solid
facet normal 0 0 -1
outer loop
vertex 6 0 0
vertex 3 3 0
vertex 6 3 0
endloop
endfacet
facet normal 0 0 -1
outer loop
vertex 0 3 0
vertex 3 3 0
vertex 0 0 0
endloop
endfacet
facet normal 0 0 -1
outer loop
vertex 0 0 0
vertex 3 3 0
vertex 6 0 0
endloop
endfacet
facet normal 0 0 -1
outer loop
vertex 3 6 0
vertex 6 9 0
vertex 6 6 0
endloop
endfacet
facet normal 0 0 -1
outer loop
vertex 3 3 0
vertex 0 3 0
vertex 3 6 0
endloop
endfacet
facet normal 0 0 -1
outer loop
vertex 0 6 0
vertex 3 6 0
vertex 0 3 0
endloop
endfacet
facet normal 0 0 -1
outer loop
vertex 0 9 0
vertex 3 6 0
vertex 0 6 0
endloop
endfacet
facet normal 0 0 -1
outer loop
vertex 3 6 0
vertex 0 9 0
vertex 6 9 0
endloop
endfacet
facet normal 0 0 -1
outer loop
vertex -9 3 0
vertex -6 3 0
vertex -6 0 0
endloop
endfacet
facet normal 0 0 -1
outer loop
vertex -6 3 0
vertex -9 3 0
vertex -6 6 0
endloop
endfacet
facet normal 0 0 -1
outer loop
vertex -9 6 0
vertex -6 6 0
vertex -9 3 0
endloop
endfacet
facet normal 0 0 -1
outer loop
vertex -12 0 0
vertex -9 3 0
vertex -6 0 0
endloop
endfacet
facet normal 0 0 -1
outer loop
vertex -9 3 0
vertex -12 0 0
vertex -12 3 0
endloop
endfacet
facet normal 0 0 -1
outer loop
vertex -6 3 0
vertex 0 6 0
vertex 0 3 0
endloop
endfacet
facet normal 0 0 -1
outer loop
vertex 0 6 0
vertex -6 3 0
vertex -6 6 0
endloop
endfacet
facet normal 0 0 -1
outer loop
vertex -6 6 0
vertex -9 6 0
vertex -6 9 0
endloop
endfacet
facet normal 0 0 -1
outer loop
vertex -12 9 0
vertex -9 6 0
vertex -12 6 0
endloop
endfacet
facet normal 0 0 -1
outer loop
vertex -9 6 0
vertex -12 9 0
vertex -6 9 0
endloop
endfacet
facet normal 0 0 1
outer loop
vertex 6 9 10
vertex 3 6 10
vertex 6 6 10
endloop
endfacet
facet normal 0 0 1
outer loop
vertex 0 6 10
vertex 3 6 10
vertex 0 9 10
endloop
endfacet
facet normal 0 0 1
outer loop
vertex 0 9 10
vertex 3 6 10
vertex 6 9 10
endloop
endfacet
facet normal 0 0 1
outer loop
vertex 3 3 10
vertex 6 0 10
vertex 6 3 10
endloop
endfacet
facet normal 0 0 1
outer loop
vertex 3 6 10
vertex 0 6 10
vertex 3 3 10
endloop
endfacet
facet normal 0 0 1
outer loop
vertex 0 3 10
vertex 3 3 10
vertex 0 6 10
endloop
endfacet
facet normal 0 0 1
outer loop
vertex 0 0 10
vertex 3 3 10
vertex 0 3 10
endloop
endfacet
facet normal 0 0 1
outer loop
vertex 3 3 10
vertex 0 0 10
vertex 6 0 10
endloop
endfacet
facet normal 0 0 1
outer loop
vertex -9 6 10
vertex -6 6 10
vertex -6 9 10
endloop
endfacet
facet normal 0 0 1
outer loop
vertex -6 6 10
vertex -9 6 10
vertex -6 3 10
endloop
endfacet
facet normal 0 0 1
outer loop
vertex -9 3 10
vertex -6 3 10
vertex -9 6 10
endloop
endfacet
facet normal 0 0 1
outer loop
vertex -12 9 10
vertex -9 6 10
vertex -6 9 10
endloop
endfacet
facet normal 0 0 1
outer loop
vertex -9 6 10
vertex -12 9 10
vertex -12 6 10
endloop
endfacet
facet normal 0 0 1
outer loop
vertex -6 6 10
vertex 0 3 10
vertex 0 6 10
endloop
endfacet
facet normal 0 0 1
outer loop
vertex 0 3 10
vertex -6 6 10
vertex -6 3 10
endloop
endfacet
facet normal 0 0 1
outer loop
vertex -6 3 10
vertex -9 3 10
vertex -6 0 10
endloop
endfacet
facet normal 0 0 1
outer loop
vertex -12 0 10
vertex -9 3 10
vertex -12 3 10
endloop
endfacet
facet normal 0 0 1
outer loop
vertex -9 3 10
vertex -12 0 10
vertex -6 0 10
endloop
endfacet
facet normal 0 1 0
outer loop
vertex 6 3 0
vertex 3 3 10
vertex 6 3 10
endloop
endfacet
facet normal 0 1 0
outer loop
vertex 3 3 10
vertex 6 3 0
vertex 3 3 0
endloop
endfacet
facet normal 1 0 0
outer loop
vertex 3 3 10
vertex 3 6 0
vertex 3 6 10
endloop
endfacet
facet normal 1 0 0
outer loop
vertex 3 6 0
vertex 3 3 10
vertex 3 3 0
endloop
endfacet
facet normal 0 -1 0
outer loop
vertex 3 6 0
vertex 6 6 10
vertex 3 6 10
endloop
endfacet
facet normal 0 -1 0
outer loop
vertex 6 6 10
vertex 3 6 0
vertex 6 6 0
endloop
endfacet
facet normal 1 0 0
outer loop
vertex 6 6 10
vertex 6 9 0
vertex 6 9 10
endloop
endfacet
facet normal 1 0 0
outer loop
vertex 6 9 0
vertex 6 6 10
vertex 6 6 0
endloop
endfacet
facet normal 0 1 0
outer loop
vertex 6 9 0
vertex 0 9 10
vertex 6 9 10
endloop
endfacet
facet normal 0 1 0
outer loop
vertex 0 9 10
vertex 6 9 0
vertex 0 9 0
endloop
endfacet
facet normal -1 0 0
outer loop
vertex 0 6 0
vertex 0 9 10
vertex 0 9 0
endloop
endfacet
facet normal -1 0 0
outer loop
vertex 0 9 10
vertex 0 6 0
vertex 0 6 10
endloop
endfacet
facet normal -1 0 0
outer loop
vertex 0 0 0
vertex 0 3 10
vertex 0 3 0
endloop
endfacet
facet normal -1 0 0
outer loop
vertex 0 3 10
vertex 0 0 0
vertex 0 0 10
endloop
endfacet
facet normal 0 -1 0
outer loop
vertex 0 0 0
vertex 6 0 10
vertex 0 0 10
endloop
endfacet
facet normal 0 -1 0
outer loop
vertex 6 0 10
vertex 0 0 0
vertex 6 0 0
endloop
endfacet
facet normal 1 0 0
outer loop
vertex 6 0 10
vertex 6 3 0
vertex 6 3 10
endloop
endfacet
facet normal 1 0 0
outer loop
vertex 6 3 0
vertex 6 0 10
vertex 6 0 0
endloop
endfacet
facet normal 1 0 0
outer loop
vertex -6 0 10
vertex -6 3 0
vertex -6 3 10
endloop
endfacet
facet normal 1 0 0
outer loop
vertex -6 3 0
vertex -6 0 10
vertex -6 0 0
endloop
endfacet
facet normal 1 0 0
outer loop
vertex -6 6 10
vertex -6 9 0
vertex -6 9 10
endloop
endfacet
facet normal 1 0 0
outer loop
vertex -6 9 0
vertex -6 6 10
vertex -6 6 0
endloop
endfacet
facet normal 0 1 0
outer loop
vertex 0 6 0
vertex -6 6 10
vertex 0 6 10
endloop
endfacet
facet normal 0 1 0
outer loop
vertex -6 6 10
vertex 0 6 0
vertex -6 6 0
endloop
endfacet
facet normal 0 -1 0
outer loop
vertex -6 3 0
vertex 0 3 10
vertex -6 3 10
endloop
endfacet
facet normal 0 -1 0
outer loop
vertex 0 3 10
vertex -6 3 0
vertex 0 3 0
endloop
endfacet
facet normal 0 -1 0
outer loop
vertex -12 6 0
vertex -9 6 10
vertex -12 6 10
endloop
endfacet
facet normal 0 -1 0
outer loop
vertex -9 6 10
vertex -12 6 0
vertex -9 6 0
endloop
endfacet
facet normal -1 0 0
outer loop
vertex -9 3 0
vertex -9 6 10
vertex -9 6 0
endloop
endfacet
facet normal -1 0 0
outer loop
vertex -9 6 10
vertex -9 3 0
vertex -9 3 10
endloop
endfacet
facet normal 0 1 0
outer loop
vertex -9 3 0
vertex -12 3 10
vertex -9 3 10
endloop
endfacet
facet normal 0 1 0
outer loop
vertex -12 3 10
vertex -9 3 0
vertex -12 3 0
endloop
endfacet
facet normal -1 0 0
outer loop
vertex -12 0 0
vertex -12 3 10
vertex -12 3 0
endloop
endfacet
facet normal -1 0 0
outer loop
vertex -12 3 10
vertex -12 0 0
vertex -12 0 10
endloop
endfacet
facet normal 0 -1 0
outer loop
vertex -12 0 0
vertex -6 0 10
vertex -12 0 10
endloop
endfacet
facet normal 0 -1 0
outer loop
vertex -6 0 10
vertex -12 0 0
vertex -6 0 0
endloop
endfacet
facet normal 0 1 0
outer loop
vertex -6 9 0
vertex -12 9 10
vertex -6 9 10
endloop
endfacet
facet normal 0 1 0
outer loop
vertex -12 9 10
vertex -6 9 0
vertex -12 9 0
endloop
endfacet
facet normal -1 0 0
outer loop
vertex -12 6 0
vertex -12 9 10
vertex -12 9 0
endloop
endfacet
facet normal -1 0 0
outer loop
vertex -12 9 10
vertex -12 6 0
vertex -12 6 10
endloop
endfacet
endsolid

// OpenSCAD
module SimpleCorner(wallWidth = 3,
                    totalWidth = 50,
                    totalHeight = 50,
                    totalDepth = 50,
                    gutterWidth = 3)
{
    // back wall
    cube([totalWidth,wallWidth,totalHeight]);
    // side wall
    translate([totalWidth,0,0])
        rotate([0,0,90])
            cube([totalDepth,wallWidth,totalHeight]);
    // base
    translate([0,totalDepth,0])
        rotate([90, 0, 0])
            cube([totalWidth,
                  wallWidth,
                  totalDepth]);
    // back gutter
    translate([0,
               wallWidth + gutterWidth,
               wallWidth * 2])
        rotate([0,90,0])
            cube([wallWidth, 
                  wallWidth, 
                  totalWidth - wallWidth - gutterWidth]);
    // side gutter
    translate([totalWidth - 2 * wallWidth - gutterWidth,
               totalDepth,
               wallWidth])
        rotate([90,0,0])
            cube([wallWidth, 
                  wallWidth, 
                  totalDepth - wallWidth - gutterWidth]);
    // gutter fill
    cube(3);
}
module Cone(holeRadius = 3)
{
    centerRadius    = 3;
    centerHeight    = 2;
    masterRadius    = 18;
    totalHeight     = 3;
    tanAlpha        = totalHeight / (masterRadius - centerRadius);
    holeHeight      = tanAlpha * (masterRadius - holeRadius);
    rotate_extrude()
        polygon(points=[
            [0, 0],
            [masterRadius, 0],
            [holeRadius, holeHeight],
            [holeRadius, 1],
            [0, 1]
        ]);
}
module Base(width = 50,
       depth = 50,
       halfHeight = 3)
{
    cube([width, depth, halfHeight]);
    translate([width / 2, depth / 2, halfHeight])
        Cone(3.5);
}

module BasedCorner(wallWidth = 3,
                   width = 50,
                   height = 50,
                   depth = 50,
                   gutterWidth = 3.4)
{
    translate([0, 0, wallWidth])
        union() {
            SimpleCorner(wallWidth, 
                         width, 
                         height - wallWidth, 
                         depth,
                         gutterWidth);
            translate([0,0, -wallWidth])
                difference() {
                    cube([width, depth, wallWidth]);
                    translate([width/2, depth/2, -.01])
                        Cone();
            }
        }
}

module top_profile(gutterWidth = 3) 
{
    polygon([
        [0, 0],
        [0, 9],
        [6, 9],
        [6, 6],
        [21,6],
        [21,3],
        [6 + gutterWidth, 3],
        [6 + gutterWidth, 0],
        [3 + gutterWidth, 0],
        [3 + gutterWidth, 3],
        [3, 3],
        [3, 0],
    ]);
}


module CableCoverBorderProfile(
    width = 6,
    borderHeight = 3,
    gutterHeight = 3,
    gutterWidth = 3)
{
    polygon([
        [0,0],
        [width, 0],
        [width, borderHeight],
        [width - gutterWidth, borderHeight],
        [width - gutterWidth, borderHeight + gutterHeight],
        [width, borderHeight + gutterHeight],
        [width, 2 * borderHeight + gutterHeight],
        [0, 2 * borderHeight + gutterHeight]
    ]);
}
module CableCoverBorderLinear(height = 10)
{
    linear_extrude(height)
        CableCoverBorderProfile();
}
union()
{
    //rotate_extrude(180)
    //    CableCoverBorderProfile();
    CableCoverBorderLinear();
    translate([-6, 3, 0])
        cube([6, 3, 10]);
    translate([-6, 9, 0])
        rotate([0, 0, 180])
            CableCoverBorderLinear();
}
